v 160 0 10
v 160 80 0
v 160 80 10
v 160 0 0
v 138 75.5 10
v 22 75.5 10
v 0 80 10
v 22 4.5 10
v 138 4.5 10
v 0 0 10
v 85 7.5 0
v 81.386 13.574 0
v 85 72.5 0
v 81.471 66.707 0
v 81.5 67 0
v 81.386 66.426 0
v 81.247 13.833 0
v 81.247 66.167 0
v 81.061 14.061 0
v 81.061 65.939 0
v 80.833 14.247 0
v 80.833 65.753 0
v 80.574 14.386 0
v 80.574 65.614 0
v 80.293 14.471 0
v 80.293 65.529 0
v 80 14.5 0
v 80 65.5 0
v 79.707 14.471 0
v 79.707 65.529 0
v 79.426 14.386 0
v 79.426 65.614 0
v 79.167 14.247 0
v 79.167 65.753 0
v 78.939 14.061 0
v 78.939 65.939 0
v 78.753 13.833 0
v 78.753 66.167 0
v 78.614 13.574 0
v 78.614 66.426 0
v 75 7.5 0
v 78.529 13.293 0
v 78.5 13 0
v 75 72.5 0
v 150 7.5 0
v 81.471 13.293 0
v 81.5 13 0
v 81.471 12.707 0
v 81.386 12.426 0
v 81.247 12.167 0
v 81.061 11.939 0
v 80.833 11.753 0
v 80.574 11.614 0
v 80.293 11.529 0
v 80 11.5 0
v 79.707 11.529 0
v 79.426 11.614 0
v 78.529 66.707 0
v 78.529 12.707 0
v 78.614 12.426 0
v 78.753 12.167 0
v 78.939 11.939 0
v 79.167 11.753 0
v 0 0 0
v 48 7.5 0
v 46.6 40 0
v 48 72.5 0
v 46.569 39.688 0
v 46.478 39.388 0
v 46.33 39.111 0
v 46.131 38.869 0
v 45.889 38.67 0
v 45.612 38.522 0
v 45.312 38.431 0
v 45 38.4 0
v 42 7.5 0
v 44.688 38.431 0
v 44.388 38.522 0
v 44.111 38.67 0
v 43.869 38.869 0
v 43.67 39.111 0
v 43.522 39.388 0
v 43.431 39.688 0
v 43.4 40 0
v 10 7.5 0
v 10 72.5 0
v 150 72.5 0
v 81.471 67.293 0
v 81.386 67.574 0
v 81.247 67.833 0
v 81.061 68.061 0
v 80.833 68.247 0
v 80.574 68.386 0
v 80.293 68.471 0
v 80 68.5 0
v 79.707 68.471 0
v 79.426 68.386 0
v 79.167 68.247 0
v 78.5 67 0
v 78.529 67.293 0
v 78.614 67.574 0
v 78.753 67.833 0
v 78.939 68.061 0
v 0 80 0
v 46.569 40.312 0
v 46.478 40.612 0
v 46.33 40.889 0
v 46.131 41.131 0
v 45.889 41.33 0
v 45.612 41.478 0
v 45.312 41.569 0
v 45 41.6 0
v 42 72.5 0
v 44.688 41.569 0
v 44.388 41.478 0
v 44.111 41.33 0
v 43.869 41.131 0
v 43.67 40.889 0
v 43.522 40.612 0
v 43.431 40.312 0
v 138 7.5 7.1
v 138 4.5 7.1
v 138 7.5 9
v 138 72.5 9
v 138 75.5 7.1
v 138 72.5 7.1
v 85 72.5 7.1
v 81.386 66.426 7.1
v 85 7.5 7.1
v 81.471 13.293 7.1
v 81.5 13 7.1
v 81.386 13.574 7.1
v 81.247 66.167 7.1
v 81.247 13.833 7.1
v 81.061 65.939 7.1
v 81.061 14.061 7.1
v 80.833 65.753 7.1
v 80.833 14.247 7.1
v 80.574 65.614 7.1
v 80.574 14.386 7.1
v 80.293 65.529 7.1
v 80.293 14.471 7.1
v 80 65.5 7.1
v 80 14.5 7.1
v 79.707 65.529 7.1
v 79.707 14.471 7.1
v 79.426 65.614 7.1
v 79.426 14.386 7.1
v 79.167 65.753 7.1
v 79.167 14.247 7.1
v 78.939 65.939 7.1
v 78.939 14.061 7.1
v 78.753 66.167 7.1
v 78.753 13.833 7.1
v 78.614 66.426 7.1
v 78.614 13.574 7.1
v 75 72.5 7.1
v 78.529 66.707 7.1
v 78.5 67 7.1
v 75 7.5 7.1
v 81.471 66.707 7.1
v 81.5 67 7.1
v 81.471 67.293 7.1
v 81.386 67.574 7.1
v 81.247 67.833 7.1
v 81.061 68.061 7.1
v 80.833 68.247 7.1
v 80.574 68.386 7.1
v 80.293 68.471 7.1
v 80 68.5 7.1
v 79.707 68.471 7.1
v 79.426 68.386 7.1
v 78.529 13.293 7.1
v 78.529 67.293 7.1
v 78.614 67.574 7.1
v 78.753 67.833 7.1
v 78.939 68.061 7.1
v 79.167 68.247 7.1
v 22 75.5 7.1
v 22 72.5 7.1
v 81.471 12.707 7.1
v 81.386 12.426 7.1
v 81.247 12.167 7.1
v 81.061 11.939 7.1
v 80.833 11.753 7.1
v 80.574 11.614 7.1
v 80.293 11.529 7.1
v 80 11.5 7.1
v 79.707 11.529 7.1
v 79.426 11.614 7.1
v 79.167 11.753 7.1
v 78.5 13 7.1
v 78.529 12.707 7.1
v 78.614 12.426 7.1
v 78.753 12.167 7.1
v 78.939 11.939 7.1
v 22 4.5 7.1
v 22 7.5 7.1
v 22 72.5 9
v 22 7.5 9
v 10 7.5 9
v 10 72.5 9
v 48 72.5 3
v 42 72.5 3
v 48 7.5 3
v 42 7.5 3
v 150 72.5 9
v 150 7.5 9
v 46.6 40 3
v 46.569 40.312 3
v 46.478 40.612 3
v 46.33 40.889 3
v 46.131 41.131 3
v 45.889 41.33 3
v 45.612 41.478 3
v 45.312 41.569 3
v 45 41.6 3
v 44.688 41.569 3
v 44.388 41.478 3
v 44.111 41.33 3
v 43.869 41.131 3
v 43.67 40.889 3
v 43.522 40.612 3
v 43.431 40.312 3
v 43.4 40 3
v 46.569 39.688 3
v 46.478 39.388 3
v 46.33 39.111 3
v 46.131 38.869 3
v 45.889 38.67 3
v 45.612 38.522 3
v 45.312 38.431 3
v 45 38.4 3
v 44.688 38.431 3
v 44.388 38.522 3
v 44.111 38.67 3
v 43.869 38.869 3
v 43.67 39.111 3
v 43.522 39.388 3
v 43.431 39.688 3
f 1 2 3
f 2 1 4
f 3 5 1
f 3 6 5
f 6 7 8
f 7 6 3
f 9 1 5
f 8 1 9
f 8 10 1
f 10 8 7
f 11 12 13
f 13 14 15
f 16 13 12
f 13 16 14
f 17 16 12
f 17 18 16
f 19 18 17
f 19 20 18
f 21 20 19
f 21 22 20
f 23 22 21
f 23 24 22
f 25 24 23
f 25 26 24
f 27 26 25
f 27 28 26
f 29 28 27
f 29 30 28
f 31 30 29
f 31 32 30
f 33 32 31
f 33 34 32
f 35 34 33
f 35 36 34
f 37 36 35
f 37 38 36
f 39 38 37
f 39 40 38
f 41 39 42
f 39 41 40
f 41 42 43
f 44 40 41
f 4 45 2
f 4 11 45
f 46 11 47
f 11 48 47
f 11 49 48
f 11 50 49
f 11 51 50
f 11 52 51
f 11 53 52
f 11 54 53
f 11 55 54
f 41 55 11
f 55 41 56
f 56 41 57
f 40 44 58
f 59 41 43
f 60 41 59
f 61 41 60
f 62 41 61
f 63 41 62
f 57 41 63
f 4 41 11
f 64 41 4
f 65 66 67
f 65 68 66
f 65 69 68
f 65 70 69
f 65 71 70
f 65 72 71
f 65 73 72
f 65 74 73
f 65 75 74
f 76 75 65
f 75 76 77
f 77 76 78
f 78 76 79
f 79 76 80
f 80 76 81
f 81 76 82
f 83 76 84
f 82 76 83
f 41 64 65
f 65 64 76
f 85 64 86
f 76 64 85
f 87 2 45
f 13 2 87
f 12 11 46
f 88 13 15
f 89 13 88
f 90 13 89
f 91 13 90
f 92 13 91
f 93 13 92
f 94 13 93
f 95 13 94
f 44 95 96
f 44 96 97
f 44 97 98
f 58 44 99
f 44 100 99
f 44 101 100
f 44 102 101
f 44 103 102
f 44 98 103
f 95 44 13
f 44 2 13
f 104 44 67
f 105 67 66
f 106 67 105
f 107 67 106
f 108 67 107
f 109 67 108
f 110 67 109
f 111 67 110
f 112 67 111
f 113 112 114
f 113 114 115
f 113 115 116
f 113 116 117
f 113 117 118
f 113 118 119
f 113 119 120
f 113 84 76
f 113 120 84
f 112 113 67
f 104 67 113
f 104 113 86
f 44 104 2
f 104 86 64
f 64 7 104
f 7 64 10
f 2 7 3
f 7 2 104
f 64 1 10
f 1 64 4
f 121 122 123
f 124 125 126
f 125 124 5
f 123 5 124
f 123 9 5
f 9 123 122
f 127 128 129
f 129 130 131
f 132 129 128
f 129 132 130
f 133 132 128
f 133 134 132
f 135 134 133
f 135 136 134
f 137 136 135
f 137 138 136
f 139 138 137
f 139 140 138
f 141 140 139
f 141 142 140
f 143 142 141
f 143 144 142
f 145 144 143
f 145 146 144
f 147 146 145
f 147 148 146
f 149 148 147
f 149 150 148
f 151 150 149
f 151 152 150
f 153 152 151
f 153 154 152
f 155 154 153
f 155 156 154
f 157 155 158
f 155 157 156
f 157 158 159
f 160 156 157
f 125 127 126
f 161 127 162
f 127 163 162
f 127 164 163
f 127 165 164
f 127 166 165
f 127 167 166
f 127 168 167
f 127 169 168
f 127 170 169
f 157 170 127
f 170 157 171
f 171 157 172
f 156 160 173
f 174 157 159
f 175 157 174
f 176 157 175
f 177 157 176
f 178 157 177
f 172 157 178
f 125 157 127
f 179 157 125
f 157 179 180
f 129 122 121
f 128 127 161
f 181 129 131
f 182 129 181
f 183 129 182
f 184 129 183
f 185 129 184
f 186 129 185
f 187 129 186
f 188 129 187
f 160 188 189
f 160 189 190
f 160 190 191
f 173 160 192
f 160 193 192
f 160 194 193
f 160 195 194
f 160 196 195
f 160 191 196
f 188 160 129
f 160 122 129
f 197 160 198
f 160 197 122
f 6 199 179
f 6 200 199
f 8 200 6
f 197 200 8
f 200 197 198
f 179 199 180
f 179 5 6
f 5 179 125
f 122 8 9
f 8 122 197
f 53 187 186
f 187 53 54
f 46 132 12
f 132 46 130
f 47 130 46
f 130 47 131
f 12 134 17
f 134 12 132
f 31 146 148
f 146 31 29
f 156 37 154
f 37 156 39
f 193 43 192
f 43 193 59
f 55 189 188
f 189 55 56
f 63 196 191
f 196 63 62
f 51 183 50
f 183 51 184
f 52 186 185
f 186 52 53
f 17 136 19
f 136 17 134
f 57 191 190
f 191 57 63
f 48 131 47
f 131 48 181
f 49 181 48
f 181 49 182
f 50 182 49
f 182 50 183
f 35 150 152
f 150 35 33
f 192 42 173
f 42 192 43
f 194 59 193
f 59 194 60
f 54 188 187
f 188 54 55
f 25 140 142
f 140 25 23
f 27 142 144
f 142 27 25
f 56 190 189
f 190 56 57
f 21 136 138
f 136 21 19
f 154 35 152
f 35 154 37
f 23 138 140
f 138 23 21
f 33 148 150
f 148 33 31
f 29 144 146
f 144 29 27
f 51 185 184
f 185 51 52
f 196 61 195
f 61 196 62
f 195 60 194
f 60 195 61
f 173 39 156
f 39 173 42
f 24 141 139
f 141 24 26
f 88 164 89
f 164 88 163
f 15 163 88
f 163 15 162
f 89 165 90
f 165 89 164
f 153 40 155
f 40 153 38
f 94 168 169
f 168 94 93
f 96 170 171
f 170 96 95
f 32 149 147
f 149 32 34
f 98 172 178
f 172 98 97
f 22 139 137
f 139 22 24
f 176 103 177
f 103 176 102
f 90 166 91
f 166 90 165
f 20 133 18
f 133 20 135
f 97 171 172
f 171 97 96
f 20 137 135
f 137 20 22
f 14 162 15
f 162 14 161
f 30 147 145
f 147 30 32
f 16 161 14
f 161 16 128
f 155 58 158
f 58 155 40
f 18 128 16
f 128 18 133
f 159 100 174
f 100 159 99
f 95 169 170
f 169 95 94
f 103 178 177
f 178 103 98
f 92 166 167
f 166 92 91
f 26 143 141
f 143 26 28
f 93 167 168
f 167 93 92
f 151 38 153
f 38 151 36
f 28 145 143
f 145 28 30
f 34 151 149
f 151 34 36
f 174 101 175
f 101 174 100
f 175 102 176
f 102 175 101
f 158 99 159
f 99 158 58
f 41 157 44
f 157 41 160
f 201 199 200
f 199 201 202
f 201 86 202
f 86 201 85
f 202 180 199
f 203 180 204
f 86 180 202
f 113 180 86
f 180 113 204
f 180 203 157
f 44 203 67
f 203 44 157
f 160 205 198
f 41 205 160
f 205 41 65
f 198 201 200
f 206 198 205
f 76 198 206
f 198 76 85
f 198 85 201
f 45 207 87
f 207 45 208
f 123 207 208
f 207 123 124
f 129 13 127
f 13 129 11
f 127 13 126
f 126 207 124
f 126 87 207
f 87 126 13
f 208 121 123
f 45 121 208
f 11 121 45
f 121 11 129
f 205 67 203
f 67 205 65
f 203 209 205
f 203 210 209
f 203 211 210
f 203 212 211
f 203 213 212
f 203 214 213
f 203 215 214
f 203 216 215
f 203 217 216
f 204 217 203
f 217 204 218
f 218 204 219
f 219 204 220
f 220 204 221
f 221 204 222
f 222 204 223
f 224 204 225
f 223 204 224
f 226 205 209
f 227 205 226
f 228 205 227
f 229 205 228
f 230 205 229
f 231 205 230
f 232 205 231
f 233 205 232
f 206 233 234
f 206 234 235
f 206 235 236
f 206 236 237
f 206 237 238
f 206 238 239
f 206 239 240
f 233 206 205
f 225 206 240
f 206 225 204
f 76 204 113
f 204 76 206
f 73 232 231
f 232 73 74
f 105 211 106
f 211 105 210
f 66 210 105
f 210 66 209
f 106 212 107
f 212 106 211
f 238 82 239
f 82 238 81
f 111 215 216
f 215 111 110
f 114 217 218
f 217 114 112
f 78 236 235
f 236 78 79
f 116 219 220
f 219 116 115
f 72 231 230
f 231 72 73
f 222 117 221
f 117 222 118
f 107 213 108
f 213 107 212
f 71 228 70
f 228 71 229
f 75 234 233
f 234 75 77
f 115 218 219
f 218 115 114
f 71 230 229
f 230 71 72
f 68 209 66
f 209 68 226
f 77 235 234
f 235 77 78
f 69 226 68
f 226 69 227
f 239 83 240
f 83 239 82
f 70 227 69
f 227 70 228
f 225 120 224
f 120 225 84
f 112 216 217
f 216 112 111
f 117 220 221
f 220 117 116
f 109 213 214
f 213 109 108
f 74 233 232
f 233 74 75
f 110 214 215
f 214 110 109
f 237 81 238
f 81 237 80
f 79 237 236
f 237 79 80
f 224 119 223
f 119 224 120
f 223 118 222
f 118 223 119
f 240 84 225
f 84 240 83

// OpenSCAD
difference(){
    cube([160,80,10]);
    translate([(160-116)/2,(80-71)/2,7.1])
    cube([116,71,3]);
    
    translate([80,13,-1])
    cylinder(r=1.5, h=12, $fn=32); // TODO: check radius
    
    translate([80,80-13,-1])
    cylinder(r=1.5, h=12, $fn=32); // TODO: check radius
 
    translate([10, (80-65)/2, -1])
    cube([65, 65, 10]);
    
    translate([85, (80-65)/2, -1])
    cube([65, 65, 10]);    
}

difference(){
    translate([45-3,0,0])
    cube([6, 80, 3]);
    
    translate([45, 80/2, -1])
    cylinder(r=1.6, h=20, $fn=32);
}    
